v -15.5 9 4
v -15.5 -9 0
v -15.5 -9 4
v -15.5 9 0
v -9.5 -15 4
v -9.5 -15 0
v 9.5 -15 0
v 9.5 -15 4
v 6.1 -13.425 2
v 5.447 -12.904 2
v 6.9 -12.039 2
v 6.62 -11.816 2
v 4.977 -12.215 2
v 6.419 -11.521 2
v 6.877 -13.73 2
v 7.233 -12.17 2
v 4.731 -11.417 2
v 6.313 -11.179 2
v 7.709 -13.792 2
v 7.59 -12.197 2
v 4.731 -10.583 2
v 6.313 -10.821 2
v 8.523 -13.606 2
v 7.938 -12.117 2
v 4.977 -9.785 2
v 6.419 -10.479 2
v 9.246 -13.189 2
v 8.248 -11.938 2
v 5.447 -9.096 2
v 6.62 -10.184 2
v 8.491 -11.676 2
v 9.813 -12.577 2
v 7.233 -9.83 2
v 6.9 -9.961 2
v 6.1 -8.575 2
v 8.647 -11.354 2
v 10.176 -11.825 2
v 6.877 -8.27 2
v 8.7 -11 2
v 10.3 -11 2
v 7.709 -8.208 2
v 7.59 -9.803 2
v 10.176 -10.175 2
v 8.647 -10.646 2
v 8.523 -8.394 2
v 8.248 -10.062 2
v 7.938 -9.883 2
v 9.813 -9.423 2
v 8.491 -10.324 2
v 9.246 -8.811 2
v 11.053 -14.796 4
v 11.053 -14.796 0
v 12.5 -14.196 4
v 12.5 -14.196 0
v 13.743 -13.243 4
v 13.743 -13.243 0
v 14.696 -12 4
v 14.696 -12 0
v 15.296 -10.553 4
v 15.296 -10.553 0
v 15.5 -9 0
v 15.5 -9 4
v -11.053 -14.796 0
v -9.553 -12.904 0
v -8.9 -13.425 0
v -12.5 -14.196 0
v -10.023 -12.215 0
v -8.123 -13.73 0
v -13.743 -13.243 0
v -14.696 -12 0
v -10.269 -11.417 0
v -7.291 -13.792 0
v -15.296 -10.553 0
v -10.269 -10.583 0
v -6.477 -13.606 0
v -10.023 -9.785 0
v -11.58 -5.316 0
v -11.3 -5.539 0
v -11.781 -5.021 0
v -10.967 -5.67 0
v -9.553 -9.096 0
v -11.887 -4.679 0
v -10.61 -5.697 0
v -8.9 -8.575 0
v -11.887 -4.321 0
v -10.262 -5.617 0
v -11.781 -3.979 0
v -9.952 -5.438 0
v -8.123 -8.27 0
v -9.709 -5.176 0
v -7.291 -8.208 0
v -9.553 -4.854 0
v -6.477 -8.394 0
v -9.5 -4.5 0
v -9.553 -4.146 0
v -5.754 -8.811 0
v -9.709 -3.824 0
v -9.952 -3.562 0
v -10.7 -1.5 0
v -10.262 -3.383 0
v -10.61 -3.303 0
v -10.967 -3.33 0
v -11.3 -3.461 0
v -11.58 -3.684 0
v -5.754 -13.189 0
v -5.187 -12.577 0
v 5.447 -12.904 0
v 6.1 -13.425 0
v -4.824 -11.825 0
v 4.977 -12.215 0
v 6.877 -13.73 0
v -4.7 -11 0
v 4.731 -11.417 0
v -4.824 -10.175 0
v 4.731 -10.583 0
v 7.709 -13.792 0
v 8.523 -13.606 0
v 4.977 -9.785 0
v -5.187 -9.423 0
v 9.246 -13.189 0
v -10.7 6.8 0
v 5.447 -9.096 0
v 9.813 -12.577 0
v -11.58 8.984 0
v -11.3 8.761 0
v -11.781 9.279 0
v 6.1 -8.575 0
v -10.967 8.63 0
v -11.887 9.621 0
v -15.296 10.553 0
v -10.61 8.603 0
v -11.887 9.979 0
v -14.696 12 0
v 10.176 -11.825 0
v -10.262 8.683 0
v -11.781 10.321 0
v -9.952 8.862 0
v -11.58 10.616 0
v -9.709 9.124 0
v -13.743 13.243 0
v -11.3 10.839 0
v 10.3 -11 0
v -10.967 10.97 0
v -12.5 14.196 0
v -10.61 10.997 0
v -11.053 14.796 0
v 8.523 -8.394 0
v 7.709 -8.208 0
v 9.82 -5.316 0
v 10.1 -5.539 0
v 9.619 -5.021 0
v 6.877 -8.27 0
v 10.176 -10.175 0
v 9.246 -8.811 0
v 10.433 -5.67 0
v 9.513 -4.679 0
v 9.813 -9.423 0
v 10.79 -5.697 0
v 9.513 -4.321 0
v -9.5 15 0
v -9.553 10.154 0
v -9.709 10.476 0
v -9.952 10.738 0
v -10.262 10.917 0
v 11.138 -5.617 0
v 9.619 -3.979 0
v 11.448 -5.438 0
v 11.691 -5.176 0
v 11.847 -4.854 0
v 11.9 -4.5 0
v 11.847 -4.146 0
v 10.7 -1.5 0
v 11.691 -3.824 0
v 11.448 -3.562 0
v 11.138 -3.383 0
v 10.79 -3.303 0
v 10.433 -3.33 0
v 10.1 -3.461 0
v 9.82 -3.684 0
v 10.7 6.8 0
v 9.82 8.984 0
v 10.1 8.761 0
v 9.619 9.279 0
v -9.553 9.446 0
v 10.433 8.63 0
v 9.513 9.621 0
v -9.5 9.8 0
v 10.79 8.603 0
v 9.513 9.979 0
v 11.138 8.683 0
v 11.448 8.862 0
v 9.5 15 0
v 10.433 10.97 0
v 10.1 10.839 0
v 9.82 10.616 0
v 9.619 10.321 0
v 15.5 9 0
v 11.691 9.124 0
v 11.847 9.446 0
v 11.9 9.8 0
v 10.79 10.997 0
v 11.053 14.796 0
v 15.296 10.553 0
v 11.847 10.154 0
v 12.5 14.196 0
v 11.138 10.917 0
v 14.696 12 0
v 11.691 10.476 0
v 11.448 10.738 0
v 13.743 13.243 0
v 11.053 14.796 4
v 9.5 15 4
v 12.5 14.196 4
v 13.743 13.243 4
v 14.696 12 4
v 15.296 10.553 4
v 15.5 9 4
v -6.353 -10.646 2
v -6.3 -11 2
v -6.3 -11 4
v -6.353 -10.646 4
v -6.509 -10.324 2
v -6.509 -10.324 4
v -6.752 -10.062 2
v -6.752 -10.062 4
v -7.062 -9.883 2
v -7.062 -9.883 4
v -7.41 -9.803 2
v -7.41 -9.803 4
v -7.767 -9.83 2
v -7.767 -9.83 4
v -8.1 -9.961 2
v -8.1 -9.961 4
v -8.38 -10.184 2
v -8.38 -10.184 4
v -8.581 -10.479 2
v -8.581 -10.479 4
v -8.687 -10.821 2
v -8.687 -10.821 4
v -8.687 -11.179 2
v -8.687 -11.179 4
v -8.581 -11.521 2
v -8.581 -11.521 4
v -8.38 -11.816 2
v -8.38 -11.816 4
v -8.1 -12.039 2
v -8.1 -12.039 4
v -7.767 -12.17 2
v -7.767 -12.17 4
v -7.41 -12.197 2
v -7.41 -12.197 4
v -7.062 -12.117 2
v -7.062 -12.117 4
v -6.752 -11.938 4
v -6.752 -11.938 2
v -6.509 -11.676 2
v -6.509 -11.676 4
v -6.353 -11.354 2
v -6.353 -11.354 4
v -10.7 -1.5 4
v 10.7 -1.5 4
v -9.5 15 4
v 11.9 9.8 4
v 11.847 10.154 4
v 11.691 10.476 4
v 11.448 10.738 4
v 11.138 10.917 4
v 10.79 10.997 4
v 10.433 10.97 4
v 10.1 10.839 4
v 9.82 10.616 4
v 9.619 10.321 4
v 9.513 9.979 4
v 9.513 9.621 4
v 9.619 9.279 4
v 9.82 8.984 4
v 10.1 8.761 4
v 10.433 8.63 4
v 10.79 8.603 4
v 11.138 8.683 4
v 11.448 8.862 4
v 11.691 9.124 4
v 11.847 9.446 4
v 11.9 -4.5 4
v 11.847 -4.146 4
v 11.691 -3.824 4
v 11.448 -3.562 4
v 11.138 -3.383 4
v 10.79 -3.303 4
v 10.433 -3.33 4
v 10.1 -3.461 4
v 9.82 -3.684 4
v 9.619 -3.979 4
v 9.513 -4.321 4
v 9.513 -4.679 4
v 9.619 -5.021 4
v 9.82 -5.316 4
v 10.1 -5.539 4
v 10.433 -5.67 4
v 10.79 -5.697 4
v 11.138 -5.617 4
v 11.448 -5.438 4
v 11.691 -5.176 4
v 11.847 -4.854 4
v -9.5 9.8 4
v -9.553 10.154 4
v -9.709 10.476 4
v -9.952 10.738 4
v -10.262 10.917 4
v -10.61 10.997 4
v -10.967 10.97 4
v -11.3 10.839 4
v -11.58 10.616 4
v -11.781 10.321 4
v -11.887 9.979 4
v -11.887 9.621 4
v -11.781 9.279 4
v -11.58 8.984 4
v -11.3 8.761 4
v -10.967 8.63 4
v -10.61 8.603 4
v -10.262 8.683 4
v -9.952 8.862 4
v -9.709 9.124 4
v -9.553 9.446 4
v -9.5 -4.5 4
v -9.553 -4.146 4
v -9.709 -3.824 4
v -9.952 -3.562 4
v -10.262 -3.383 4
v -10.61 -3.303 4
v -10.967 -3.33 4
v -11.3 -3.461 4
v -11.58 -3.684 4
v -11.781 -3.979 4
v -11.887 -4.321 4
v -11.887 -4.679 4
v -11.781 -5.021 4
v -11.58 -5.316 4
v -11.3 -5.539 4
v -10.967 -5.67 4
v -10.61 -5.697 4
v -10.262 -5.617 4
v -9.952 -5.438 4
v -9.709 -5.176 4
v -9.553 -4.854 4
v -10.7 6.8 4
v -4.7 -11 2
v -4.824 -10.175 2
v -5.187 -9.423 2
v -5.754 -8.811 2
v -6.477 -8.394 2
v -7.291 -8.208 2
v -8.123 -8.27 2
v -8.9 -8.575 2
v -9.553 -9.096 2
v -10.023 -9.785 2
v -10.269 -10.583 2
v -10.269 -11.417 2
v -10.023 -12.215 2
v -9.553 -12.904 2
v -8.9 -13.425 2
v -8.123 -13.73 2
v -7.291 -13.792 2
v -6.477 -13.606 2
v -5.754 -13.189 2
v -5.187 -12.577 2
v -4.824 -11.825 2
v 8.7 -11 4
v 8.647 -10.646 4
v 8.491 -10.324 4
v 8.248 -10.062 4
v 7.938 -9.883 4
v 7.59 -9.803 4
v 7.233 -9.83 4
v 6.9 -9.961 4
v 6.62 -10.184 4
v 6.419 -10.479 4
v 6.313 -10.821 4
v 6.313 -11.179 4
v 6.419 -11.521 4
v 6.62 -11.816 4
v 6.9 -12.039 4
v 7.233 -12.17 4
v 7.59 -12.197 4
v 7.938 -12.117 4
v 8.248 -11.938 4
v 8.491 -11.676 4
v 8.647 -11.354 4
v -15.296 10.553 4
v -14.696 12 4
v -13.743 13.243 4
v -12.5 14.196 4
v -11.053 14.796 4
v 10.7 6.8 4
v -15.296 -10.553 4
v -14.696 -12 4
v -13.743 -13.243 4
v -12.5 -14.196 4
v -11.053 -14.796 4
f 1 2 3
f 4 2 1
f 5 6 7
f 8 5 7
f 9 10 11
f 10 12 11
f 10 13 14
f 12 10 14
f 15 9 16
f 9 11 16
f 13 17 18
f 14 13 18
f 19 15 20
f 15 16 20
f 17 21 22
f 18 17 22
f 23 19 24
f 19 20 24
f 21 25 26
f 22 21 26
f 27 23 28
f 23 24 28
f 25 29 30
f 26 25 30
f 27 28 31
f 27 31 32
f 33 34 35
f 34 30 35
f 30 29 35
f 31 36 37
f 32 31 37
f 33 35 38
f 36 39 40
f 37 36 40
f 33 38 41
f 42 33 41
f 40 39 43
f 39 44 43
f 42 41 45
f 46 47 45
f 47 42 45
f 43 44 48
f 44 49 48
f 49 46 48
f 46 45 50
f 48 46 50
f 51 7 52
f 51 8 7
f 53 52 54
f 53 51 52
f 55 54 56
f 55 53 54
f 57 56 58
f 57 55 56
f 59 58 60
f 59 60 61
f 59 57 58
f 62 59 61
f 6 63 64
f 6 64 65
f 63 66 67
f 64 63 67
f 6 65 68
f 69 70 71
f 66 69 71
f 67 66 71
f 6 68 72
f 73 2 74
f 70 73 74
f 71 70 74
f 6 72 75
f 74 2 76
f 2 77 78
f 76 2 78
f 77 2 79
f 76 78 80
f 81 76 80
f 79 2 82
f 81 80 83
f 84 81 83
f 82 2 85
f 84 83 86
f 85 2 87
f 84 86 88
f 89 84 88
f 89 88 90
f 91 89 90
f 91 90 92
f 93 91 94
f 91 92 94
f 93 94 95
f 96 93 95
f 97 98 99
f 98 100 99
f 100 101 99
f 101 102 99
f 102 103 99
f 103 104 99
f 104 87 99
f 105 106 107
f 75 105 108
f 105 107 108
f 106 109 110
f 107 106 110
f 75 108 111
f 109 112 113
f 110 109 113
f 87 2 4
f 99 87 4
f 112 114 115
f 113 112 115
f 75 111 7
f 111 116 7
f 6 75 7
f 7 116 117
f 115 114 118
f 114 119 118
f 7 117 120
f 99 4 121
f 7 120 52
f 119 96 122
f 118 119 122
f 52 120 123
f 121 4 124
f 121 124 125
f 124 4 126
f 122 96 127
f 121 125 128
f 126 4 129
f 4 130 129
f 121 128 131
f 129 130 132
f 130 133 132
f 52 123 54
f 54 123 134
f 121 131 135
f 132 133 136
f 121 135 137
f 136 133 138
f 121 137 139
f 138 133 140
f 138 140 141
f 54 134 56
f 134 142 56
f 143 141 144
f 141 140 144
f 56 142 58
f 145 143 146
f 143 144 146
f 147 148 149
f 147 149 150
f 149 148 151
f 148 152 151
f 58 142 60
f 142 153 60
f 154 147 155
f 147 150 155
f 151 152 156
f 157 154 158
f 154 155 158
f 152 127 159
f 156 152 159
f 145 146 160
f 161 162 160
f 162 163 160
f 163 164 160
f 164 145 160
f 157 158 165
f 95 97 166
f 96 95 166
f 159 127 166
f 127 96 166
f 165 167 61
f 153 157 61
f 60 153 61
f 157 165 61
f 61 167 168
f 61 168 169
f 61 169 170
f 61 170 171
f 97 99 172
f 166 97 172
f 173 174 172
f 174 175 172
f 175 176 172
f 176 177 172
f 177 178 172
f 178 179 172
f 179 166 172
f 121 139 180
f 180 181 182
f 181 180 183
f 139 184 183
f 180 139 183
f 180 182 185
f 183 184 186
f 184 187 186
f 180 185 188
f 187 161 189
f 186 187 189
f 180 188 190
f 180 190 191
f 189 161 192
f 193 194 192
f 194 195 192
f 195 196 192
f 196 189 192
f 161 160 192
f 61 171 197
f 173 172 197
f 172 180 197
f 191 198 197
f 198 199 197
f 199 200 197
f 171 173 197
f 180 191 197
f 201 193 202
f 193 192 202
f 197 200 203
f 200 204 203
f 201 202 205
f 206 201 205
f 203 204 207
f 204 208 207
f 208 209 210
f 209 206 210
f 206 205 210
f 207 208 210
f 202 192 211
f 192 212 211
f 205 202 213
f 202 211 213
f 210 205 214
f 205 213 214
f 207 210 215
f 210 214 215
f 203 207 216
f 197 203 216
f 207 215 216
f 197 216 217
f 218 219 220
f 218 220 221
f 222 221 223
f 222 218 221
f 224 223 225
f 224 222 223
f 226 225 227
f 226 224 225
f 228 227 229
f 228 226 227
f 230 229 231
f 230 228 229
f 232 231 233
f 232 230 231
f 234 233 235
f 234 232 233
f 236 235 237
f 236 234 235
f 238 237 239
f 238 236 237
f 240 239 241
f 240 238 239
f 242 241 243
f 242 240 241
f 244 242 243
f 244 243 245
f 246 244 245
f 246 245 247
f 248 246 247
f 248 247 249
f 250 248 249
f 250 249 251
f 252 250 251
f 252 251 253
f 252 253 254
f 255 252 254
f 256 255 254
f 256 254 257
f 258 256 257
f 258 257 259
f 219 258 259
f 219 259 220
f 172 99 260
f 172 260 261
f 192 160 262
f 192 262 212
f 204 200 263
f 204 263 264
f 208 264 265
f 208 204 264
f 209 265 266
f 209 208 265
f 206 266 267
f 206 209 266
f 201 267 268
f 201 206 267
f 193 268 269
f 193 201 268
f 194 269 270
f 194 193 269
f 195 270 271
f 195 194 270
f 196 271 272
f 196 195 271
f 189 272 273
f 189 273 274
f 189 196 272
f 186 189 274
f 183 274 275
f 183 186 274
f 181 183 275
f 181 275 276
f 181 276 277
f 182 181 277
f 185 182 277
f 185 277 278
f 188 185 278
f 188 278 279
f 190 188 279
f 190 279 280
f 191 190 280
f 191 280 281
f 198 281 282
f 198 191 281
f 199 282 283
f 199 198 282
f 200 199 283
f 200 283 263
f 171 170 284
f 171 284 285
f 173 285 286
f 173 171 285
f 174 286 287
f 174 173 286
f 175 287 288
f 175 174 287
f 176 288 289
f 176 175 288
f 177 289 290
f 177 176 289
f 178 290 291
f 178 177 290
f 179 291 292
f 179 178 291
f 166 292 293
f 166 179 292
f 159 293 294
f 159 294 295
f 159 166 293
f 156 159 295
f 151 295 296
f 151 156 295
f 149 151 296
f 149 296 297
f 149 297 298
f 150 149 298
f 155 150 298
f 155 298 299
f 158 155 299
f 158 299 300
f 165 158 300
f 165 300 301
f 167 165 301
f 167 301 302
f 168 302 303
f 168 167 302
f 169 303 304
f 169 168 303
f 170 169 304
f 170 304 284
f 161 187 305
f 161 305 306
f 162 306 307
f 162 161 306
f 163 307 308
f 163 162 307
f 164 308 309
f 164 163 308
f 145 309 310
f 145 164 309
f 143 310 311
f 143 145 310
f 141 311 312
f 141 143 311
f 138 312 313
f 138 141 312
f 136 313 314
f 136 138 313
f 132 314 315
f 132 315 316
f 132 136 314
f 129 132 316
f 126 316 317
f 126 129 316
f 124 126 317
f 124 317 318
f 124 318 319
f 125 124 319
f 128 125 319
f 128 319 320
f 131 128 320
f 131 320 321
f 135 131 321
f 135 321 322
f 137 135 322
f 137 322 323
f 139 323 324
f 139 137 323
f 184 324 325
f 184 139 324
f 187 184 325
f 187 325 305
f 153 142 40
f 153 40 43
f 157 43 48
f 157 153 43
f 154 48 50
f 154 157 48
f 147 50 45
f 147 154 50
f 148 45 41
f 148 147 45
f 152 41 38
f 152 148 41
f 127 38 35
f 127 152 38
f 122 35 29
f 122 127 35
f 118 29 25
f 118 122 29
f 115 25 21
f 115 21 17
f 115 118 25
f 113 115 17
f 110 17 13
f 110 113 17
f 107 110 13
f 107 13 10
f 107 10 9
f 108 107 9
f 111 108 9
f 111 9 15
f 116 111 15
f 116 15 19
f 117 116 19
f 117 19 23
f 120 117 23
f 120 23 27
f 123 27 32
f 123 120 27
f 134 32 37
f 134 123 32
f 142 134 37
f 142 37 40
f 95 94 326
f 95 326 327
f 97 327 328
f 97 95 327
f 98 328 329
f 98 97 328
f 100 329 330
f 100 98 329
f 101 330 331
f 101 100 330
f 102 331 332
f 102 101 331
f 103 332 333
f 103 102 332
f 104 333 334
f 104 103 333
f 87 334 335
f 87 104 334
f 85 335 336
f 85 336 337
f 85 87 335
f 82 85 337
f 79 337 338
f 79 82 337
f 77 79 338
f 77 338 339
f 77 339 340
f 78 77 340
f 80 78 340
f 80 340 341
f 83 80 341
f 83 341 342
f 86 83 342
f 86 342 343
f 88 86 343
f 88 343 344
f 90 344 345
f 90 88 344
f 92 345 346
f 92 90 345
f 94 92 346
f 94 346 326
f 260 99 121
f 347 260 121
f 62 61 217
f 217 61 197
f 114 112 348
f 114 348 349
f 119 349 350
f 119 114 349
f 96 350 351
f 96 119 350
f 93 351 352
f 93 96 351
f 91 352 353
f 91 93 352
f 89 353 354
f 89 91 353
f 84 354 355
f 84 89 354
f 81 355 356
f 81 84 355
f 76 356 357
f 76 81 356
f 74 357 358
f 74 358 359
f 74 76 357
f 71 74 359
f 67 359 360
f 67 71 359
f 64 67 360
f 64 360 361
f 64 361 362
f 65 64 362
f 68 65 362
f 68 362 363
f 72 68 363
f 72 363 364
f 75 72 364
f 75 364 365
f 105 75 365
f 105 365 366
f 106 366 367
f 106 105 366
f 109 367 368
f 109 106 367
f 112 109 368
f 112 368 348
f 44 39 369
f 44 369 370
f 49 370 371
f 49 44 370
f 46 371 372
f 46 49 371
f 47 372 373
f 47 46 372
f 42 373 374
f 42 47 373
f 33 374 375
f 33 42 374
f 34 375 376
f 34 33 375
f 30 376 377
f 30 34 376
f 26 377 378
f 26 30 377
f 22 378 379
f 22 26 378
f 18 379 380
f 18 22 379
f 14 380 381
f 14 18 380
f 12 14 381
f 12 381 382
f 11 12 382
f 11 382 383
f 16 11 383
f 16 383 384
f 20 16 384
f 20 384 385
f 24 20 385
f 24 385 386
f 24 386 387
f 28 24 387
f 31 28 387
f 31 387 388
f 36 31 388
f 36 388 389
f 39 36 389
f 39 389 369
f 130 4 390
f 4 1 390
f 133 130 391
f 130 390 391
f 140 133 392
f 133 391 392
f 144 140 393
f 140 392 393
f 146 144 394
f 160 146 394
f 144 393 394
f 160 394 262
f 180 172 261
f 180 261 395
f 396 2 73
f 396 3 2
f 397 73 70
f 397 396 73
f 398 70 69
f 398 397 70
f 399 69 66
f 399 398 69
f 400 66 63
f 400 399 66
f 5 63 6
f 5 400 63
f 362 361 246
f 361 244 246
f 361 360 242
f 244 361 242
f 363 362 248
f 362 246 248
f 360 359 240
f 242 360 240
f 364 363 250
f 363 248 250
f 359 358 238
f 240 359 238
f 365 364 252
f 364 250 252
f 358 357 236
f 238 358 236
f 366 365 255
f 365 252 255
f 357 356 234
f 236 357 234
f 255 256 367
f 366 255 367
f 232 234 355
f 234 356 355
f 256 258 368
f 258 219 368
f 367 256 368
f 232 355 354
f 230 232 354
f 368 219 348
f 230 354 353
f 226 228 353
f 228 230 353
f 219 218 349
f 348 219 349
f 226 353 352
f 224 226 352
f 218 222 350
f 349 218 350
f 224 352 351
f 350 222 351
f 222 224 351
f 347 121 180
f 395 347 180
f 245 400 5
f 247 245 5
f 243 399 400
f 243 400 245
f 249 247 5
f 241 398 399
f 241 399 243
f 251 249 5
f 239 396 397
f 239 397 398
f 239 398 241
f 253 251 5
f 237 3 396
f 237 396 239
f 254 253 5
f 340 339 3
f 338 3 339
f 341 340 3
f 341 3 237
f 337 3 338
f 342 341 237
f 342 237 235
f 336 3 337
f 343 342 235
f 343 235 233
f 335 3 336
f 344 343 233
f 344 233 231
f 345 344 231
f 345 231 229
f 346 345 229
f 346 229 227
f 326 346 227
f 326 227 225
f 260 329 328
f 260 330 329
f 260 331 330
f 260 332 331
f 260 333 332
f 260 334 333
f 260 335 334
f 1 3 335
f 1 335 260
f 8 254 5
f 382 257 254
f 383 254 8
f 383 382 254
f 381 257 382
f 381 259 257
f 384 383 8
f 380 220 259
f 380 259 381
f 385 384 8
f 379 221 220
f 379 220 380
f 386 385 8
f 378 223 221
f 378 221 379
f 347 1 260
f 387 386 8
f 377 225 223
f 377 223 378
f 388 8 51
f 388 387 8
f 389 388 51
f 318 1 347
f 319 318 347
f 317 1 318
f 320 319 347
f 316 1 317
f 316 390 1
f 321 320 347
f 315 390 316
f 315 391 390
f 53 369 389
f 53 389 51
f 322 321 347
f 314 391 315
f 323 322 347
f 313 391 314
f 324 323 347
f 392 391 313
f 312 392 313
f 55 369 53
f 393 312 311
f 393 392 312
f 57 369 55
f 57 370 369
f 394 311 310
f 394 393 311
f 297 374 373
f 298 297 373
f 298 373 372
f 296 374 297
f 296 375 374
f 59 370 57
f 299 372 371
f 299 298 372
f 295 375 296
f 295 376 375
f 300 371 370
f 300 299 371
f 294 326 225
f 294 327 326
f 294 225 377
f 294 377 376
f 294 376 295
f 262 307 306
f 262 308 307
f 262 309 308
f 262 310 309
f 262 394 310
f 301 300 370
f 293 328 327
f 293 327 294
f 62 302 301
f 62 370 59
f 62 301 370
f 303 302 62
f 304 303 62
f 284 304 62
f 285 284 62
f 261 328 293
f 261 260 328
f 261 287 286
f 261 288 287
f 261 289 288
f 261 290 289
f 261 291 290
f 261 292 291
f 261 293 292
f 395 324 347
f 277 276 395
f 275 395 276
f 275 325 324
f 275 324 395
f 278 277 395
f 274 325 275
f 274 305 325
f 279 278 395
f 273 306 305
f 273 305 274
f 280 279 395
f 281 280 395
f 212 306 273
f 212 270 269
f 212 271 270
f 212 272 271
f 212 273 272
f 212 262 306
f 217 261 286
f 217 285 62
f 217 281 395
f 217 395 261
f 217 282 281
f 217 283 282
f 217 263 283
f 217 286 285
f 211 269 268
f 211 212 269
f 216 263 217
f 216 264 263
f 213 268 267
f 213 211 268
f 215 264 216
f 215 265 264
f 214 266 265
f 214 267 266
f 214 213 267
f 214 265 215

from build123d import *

# Parameters (mm, degrees)
SKETCH1_W           = 31
SKETCH1_H           = 30
SKETCH1_R           = 1.2
SKETCH1_W_2         = 21.4
SKETCH1_H_2         = 8.3
BOSS_EXTRUDE1_DEPTH = 4
SKETCH1_6_R         = 2.8
SKETCH1_6_R_2       = 1.2
CUT_EXTRUDE1_DEPTH  = 2
FILLET1_R           = 6


with BuildPart() as part:
    # Sketch1 → Boss-Extrude1 (new body)
    with BuildSketch(Plane.XY):
        Rectangle(SKETCH1_W, SKETCH1_H)
        with Locations((-10.7, 9.8)):
            Circle(SKETCH1_R, mode=Mode.SUBTRACT)
        with Locations((10.7, 9.8)):
            Circle(SKETCH1_R, mode=Mode.SUBTRACT)
        with Locations((10.7, -4.5)):
            Circle(SKETCH1_R, mode=Mode.SUBTRACT)
        with Locations((-10.7, -4.5)):
            Circle(SKETCH1_R, mode=Mode.SUBTRACT)
        with Locations((-7.5, -11)):
            Circle(SKETCH1_R, mode=Mode.SUBTRACT)
        with Locations((7.5, -11)):
            Circle(SKETCH1_R, mode=Mode.SUBTRACT)
        with Locations((0, 2.65)):
            Rectangle(SKETCH1_W_2, SKETCH1_H_2, mode=Mode.SUBTRACT)
    extrude(amount=BOSS_EXTRUDE1_DEPTH)

    # Sketch1<6> → Cut-Extrude1 (cut)
    # profile 1 of 2: a face of its own
    with BuildSketch(Plane.XY):
        with Locations((-7.5, -11)):
            Circle(SKETCH1_6_R)
        with Locations((-7.5, -11)):
            Circle(SKETCH1_6_R_2, mode=Mode.SUBTRACT)
    # profile 2 of 2: a face of its own
    with BuildSketch(Plane.XY):
        with Locations((7.5, -11)):
            Circle(SKETCH1_6_R)
        with Locations((7.5, -11)):
            Circle(SKETCH1_6_R_2, mode=Mode.SUBTRACT)
    extrude(amount=CUT_EXTRUDE1_DEPTH, mode=Mode.SUBTRACT)

    # Fillet1
    fillet1_edges = [part.edges().sort_by_distance(p)[0] for p in [
        (-15.5, -15, 2),
        (-15.5, 15, 2),
        (15.5, 15, 2),
        (15.5, -15, 2),
    ]]
    fillet(fillet1_edges, radius=FILLET1_R)


solid = part.part
